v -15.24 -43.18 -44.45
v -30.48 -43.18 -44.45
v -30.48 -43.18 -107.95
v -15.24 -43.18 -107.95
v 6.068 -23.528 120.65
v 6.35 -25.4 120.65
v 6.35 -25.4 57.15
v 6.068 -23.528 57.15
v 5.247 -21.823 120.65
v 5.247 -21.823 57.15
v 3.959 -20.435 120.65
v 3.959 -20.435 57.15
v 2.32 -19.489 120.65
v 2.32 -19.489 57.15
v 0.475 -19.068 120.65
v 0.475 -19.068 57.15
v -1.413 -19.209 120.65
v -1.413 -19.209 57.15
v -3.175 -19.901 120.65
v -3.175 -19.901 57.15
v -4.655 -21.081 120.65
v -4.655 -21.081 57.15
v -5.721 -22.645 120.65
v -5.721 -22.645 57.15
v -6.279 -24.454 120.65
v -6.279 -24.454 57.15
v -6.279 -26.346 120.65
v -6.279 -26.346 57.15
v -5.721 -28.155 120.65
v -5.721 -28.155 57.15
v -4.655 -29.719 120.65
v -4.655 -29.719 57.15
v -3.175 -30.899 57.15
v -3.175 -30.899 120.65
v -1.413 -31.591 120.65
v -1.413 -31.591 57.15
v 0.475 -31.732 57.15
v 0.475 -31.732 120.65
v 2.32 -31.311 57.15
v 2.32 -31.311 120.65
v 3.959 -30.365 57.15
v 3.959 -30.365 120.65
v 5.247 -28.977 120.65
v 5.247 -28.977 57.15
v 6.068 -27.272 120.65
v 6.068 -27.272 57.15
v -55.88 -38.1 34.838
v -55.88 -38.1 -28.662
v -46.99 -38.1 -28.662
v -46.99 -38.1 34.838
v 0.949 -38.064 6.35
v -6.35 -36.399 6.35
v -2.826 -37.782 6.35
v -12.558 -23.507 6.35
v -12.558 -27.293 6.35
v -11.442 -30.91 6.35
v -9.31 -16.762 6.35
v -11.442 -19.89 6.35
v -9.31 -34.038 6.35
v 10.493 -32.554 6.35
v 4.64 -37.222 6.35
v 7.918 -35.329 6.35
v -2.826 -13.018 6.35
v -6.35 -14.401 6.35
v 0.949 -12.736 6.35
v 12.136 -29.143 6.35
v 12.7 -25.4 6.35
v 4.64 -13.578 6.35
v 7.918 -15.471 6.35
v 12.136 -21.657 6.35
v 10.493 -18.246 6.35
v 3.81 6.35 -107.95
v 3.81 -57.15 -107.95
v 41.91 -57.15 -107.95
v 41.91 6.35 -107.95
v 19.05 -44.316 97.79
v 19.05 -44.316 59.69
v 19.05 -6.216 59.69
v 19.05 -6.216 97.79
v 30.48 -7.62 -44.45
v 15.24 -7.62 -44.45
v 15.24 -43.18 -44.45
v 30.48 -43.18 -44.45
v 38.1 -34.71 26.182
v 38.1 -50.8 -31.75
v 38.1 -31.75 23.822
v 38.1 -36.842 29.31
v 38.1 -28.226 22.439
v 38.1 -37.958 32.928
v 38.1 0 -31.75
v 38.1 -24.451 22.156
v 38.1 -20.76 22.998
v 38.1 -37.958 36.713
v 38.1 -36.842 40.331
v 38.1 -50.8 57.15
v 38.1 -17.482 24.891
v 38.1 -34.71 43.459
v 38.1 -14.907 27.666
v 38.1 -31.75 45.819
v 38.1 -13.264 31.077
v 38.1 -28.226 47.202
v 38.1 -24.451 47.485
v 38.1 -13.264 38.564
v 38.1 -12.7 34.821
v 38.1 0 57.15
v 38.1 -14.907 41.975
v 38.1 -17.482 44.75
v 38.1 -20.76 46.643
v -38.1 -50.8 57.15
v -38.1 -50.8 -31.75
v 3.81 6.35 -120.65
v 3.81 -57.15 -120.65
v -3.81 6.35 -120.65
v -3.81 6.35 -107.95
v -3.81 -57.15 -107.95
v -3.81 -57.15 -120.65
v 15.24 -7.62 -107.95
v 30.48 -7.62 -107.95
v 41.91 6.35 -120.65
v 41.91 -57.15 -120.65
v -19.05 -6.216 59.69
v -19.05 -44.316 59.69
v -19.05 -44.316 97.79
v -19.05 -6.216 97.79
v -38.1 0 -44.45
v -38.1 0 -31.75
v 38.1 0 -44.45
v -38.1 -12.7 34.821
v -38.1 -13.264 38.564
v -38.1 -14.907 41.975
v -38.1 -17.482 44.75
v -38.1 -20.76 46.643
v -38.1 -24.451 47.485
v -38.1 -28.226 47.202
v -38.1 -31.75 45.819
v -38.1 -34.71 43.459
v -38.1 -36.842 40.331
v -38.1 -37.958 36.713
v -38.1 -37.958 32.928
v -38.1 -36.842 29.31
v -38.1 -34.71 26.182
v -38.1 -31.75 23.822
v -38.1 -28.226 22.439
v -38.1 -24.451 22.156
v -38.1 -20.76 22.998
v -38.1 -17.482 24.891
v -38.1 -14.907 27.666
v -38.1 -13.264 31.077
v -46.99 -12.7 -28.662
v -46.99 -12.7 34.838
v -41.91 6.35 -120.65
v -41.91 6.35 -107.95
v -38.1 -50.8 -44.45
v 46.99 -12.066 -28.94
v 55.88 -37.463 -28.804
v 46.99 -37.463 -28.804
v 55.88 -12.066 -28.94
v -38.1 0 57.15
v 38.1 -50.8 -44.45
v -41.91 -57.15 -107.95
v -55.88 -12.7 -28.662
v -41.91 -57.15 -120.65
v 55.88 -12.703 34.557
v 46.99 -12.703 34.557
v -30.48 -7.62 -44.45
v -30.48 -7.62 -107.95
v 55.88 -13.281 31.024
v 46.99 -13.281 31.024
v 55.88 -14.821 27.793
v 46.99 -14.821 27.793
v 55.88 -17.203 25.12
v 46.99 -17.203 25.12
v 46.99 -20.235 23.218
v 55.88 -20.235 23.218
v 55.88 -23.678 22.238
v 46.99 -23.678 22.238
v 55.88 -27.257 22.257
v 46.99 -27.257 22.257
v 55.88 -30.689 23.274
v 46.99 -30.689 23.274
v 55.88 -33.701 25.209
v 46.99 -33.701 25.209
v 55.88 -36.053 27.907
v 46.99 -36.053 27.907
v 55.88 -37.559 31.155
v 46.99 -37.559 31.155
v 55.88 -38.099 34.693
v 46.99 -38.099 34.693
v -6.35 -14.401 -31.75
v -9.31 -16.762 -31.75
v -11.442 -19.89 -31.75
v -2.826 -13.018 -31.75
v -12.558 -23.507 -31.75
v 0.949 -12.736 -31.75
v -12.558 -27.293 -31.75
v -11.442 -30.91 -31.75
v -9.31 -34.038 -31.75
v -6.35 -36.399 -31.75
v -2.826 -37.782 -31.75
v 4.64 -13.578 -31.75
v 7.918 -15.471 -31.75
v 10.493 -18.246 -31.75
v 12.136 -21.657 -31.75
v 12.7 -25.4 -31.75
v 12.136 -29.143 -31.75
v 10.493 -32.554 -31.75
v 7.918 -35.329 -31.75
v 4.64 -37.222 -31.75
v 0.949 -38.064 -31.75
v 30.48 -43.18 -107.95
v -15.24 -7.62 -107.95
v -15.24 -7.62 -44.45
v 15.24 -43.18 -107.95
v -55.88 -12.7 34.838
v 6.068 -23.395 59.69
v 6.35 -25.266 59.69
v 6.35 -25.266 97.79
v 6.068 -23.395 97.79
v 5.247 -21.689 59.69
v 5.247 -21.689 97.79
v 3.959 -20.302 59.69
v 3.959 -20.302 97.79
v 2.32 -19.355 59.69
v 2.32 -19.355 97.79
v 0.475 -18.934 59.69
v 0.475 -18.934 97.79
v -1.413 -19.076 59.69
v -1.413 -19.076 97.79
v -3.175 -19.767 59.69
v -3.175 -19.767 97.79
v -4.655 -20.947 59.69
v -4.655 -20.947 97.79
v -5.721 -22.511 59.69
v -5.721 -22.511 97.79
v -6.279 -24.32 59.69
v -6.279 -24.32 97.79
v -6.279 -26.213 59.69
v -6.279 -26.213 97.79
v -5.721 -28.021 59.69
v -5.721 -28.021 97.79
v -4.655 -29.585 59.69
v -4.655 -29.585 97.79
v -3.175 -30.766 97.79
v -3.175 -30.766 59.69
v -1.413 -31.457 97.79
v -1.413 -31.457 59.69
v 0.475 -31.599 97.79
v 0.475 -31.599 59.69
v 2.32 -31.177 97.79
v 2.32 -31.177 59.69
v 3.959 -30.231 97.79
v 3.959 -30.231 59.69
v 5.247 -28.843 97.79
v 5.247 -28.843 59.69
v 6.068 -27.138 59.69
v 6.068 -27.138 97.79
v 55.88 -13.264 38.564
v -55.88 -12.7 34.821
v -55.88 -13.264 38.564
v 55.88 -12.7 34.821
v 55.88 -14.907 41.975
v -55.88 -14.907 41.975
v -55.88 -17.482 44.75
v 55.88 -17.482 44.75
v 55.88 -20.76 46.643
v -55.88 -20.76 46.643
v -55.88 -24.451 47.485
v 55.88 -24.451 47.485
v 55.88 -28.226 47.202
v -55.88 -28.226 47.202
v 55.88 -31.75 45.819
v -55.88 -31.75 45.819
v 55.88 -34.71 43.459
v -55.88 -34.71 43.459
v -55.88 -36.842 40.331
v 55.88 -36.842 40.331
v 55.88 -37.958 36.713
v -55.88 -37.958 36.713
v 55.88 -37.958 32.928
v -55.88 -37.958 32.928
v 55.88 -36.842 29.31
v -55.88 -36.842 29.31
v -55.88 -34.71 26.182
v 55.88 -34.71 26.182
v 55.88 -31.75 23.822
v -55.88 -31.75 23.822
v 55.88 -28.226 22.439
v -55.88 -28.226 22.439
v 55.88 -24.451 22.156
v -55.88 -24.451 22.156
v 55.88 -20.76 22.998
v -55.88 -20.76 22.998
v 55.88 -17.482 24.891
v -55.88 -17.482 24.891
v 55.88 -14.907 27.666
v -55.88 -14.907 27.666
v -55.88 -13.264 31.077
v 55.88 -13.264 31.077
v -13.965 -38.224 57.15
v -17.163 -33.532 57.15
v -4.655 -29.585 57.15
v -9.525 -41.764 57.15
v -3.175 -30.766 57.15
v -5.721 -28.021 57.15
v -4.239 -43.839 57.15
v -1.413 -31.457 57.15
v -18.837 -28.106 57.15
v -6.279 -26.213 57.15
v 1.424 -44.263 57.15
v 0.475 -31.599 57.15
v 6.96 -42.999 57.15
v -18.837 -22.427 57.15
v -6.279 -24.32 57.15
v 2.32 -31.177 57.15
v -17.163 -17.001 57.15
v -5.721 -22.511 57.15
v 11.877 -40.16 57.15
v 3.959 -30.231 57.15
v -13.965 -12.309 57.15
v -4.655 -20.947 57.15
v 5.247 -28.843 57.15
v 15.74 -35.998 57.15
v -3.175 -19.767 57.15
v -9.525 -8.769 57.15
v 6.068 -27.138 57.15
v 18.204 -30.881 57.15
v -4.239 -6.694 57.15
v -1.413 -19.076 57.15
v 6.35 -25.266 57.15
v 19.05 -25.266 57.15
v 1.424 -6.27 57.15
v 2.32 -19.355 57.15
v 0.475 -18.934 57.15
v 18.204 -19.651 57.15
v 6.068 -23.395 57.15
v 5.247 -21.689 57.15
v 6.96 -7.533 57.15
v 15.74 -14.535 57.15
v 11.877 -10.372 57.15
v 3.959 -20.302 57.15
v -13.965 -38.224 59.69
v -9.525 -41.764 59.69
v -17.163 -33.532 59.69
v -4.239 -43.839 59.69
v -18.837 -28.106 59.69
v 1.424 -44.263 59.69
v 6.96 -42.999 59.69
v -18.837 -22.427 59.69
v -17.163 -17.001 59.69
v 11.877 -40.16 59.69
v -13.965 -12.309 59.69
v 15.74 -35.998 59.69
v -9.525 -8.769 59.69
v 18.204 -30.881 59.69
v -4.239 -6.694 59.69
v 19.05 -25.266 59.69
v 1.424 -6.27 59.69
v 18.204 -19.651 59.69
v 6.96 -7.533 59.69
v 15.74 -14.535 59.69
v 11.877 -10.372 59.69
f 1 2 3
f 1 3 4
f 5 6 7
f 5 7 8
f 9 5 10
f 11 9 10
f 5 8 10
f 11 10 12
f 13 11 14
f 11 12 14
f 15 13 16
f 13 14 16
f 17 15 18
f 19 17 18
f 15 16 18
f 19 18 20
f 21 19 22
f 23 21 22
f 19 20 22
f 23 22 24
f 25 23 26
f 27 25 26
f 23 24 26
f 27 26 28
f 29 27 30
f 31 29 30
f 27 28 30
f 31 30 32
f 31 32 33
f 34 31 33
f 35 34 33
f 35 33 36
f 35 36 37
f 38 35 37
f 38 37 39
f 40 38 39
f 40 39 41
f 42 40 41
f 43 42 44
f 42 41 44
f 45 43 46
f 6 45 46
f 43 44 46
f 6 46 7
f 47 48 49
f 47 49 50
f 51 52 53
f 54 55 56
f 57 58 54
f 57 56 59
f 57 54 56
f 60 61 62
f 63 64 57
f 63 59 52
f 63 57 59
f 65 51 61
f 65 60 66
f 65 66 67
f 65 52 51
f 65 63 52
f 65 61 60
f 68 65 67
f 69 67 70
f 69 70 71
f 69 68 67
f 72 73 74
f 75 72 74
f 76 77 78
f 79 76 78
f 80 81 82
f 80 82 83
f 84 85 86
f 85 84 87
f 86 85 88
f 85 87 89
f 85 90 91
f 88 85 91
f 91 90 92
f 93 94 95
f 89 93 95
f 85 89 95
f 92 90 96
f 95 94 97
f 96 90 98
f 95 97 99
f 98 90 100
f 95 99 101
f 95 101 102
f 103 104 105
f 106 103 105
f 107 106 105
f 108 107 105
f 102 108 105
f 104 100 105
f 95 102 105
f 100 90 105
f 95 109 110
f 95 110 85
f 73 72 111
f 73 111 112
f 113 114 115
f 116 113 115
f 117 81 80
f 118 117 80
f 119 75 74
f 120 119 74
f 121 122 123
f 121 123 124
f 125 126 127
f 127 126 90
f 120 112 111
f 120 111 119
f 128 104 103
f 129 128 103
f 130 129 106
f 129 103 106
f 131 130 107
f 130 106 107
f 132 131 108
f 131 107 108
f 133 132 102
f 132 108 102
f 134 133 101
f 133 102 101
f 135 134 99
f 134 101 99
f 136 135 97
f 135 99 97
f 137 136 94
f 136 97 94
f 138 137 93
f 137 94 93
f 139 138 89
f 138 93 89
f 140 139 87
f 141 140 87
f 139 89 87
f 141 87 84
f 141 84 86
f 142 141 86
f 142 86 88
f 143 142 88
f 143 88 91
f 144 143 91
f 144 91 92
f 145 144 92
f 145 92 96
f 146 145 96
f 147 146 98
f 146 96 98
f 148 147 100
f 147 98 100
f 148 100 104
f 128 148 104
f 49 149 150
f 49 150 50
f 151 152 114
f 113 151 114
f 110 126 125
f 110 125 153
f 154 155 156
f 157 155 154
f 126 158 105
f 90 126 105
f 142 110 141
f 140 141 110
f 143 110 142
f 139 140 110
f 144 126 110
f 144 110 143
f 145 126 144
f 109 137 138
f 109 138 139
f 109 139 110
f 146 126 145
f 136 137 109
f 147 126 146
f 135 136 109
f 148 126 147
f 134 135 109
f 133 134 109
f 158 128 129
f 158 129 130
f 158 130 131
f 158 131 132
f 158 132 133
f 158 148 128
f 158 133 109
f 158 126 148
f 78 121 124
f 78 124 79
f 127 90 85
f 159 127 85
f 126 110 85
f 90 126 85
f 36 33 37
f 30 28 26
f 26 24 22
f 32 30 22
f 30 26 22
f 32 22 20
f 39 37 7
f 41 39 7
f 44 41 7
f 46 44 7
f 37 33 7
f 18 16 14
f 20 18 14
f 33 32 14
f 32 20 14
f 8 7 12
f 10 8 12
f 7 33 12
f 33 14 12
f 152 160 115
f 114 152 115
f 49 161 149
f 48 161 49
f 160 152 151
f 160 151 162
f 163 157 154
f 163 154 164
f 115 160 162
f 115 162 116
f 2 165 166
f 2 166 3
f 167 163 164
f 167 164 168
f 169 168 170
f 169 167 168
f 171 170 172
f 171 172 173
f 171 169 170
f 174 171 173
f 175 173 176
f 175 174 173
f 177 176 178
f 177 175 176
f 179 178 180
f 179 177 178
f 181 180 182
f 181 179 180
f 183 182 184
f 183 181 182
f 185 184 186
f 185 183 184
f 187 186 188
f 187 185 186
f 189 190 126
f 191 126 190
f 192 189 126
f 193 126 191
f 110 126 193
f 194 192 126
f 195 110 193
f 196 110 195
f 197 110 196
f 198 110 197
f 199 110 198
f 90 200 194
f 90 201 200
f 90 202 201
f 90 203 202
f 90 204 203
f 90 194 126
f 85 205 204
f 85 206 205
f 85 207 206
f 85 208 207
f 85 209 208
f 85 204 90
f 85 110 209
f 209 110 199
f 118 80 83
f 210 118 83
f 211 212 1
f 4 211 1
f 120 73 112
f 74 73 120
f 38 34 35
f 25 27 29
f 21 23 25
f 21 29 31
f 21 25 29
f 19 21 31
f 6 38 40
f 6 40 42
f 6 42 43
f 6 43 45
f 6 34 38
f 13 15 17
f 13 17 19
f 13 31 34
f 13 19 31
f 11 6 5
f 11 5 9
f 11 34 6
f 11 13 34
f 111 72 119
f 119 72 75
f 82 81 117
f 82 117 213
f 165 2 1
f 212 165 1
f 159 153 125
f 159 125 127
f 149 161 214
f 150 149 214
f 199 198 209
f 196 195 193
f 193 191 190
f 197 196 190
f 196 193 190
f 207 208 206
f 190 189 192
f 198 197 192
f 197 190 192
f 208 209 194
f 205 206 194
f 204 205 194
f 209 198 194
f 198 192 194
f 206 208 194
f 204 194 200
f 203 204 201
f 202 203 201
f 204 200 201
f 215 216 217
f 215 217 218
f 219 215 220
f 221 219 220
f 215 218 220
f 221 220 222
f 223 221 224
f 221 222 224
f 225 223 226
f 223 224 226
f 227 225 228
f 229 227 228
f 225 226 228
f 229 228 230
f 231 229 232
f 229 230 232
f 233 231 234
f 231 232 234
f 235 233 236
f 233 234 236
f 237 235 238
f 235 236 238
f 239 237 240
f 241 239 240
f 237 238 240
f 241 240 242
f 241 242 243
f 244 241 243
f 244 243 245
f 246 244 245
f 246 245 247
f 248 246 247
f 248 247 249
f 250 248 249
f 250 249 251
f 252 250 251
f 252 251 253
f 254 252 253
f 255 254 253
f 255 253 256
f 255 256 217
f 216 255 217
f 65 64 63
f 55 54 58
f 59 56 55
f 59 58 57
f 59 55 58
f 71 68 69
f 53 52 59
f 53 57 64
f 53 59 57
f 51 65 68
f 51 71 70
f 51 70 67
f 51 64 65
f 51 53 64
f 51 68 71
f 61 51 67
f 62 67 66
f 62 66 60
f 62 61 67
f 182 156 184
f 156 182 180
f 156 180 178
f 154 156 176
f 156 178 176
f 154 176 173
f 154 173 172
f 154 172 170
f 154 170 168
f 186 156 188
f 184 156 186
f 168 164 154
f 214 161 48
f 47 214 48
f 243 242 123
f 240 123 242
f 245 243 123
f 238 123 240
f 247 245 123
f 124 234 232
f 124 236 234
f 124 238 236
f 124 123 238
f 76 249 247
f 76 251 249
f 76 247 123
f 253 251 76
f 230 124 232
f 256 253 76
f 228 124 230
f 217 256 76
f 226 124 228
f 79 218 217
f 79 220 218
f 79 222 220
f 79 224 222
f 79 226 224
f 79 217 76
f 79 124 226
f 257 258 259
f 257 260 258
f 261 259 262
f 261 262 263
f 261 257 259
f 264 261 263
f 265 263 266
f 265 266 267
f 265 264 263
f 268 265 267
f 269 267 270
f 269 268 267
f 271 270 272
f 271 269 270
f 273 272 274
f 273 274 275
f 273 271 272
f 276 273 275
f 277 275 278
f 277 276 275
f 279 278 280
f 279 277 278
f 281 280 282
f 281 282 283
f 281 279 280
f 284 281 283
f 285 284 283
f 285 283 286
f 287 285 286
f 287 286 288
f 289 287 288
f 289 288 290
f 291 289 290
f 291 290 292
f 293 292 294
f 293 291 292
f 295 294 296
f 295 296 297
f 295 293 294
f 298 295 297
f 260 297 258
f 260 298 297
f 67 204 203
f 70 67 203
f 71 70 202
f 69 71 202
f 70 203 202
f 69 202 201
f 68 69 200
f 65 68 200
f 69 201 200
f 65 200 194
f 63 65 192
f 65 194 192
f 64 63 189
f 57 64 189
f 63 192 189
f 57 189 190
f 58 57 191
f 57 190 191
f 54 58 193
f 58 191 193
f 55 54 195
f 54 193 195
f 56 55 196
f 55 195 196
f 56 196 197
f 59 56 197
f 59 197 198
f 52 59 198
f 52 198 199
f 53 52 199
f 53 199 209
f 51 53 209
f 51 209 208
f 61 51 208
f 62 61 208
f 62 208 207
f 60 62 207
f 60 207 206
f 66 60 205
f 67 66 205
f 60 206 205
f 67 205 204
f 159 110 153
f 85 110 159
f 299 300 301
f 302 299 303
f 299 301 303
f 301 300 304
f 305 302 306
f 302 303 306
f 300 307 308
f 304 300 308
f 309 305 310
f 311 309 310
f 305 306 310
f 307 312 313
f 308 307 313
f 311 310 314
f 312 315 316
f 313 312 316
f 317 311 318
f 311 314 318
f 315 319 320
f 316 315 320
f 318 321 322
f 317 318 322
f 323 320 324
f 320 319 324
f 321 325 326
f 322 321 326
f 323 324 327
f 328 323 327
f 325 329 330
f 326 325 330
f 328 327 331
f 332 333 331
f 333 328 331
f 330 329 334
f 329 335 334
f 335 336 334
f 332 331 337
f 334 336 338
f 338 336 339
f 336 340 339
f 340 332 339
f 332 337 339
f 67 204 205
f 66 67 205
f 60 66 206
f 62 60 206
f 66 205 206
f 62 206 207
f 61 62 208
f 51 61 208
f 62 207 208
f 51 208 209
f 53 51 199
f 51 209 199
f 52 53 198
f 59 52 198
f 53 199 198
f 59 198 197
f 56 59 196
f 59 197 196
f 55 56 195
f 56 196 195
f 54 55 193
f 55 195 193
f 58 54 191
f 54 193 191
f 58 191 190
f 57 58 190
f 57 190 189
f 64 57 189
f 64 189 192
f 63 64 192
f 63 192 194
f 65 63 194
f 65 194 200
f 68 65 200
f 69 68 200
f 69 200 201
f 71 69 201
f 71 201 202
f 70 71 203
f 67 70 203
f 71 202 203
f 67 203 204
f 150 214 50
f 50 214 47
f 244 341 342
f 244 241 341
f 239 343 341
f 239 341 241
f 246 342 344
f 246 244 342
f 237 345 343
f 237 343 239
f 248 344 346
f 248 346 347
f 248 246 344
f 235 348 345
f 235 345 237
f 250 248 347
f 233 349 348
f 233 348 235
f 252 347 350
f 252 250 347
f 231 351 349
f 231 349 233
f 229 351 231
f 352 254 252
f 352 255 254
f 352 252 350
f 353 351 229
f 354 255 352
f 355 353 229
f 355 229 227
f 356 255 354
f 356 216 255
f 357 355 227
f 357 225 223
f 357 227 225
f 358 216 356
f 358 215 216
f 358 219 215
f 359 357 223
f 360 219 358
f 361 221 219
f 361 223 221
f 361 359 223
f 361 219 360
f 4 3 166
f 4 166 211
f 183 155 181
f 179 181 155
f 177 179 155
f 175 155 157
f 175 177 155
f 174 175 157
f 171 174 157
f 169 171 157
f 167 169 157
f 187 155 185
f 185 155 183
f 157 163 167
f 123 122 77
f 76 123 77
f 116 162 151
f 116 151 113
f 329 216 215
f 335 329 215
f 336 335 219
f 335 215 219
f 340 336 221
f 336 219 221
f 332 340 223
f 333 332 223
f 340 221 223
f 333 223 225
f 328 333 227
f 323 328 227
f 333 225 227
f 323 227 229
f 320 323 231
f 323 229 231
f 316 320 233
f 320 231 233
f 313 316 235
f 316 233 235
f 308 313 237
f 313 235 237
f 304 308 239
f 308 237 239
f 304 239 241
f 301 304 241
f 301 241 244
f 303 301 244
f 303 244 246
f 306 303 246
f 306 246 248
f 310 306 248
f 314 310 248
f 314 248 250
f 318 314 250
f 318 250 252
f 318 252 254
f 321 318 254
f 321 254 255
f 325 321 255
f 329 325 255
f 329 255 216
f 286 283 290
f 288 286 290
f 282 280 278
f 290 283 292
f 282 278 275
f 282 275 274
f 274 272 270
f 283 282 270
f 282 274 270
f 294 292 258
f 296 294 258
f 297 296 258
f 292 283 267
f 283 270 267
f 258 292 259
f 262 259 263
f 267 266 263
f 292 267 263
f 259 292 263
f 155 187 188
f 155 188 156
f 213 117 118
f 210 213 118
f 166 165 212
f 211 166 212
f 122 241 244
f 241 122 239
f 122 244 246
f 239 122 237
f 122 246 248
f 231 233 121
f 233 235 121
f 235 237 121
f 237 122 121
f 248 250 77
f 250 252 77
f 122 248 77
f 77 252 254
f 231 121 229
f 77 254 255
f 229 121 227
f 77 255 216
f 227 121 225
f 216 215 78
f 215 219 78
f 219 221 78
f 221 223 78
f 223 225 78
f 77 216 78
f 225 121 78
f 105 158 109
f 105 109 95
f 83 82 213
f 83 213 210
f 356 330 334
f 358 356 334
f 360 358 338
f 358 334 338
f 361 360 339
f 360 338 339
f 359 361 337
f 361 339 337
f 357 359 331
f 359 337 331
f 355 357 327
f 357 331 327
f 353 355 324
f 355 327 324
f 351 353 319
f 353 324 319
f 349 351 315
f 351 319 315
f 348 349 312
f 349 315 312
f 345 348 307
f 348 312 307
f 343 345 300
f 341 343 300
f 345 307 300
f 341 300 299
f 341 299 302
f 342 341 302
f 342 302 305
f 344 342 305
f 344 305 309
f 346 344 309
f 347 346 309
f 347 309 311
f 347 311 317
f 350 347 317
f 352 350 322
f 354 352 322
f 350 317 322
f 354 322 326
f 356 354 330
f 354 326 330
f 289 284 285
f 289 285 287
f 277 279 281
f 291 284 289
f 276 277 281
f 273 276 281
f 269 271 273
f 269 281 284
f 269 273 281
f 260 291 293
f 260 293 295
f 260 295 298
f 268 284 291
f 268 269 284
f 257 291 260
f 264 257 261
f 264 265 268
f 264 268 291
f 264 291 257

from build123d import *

# Parameters (mm, degrees)
F0_W          = 76.2
F0_H          = 114.3
F1_DEPTH      = 50.8
F2_R          = 12.7
F3_DEPTH      = 76.2
F4_W          = 76.2
F4_H          = 50.8
F4_R          = 12.7
F5_DEPTH      = 25.4
F6_R          = 12.7
F7_DEPTH      = 38.1
F8_R          = 12.7
F9_DEPTH      = 17.78
F9_DEPTH_BACK = 93.98
F11_DEPTH     = 8.89
F12_W         = 25.4
F12_H         = 63.5
F13_DEPTH     = 8.89
F14_W         = 76.2
F14_H         = 50.8
F15_DEPTH     = 12.7
F16_W         = 15.24
F16_H         = 35.56
F17_DEPTH     = 63.5
F18_W         = 38.1
F18_H         = 63.5
F18_W_2       = 15.24
F18_H_2       = 35.56
F19_DEPTH     = 12.7
F20_R         = 19.05
F21_DEPTH     = 2.54
F22_W         = 38.1
F22_H         = 38.1
F23_DEPTH     = 38.1
F24_R         = 6.35
F25_DEPTH     = 40.64
F26_R         = 6.35
F27_DEPTH     = 63.5
F28_R         = 12.7
F29_DEPTH     = 38.1


# Not quite as in the source:
# - a feature of the source that left no trace in its solid (it failed there, or was rolled back) is left out


with BuildPart() as f1:
    # F0 (on Front) → F1 (new body)
    with BuildSketch(Plane.XZ):
        Rectangle(F0_W, F0_H)
    extrude(amount=F1_DEPTH)

    # F2 (on face) → F3 (cut)
    with BuildSketch(Plane.YZ.offset(38.1)):
        with Locations((-25.4, 34.8205566406)):
            Circle(F2_R)
    extrude(amount=-F3_DEPTH, mode=Mode.SUBTRACT)

    # F4 (on face) → F5 (cut)
    with BuildSketch(Plane(origin=(0, 0, -57.15), x_dir=(1, 0, 0), z_dir=(0, 0, -1))):
        with Locations((0, 25.4)):
            Rectangle(F4_W, F4_H)
        with Locations((0, 25.4)):
            Circle(F4_R, mode=Mode.SUBTRACT)
        with Locations((0, 25.4)):
            Circle(F4_R)
    extrude(amount=-F5_DEPTH, mode=Mode.SUBTRACT)

    # F6 (on face) → F7 (cut)
    with BuildSketch(Plane(origin=(0, 0, -31.75), x_dir=(1, 0, 0), z_dir=(0, 0, -1))):
        with Locations((0, 25.4)):
            Circle(F6_R)
    extrude(amount=-F7_DEPTH, mode=Mode.SUBTRACT)


with BuildPart() as f9:
    # F8 (on face) → F9 (new body, two sides)
    with BuildSketch(Plane.YZ.offset(38.1)) as f9_sk:
        with Locations((-25.4, 34.8205566406)):
            Circle(F8_R)
    extrude(amount=F9_DEPTH)
    extrude(f9_sk.sketch, amount=-F9_DEPTH_BACK)


with BuildPart() as f11:
    # F10 (on face) → F11 (new body)
    with BuildSketch(Plane.YZ.offset(55.88)):
        with BuildLine():
            ThreePointArc((-12.7027346591, 34.5570175282), (-25.4681418528, 22.1207394495), (-38.0993622657, 34.6932851007))
            Line((-38.0993622657, 34.6932851007), (-37.4630045663, -28.8035262277))
            Line((-37.4630045663, -28.8035262277), (-12.0663769597, -28.9397938002))
            Line((-12.0663769597, -28.9397938002), (-12.7027346591, 34.5570175282))
        make_face()
    extrude(amount=-F11_DEPTH)


with BuildPart() as f13:
    # F12 (on face) → F13 (new body)
    with BuildSketch(Plane(origin=(-55.88, 0, 0), x_dir=(0, -1, 0), z_dir=(-1, 0, 0))):
        with Locations((25.4000125671, 3.0884229026)):
            Rectangle(F12_W, F12_H)
    extrude(amount=-F13_DEPTH)


with BuildPart() as f15:
    # F14 (on face) → F15 (new body)
    with BuildSketch(Plane(origin=(0, 0, -31.75), x_dir=(1, 0, 0), z_dir=(0, 0, -1))):
        with Locations((0, 25.4)):
            Rectangle(F14_W, F14_H)
    extrude(amount=F15_DEPTH)


with BuildPart() as f17:
    # F16 (on face) → F17 (new body)
    with BuildSketch(Plane(origin=(0, 0, -44.45), x_dir=(1, 0, 0), z_dir=(0, 0, -1))):
        with Locations((-22.86, 25.4)):
            Rectangle(F16_W, F16_H)
    extrude(amount=F17_DEPTH)


with BuildPart() as f17b:
    # F16 (on face) → F17, piece 2 (new body)
    with BuildSketch(Plane(origin=(0, 0, -44.45), x_dir=(1, 0, 0), z_dir=(0, 0, -1))):
        with Locations((22.86, 25.4)):
            Rectangle(F16_W, F16_H)
    extrude(amount=F17_DEPTH)


with BuildPart() as f19:
    # F18 (on face) → F19 (new body)
    with BuildSketch(Plane(origin=(0, 0, -107.95), x_dir=(1, 0, 0), z_dir=(0, 0, -1))):
        with Locations((-22.86, 25.4)):
            Rectangle(F18_W, F18_H)
        with Locations((-22.86, 25.4)):
            Rectangle(F18_W_2, F18_H_2, mode=Mode.SUBTRACT)
        with Locations((-22.86, 25.4)):
            Rectangle(F18_W_2, F18_H_2)
    extrude(amount=F19_DEPTH)


with BuildPart() as f19b:
    # F18 (on face) → F19, piece 2 (new body)
    with BuildSketch(Plane(origin=(0, 0, -107.95), x_dir=(1, 0, 0), z_dir=(0, 0, -1))):
        with Locations((22.86, 25.4)):
            Rectangle(F18_W, F18_H)
    extrude(amount=F19_DEPTH)


with BuildPart() as f21:
    # F20 (on face) → F21 (new body)
    with BuildSketch(Plane.XY.offset(57.15)):
        with Locations((0, -25.266315788)):
            Circle(F20_R)
    extrude(amount=F21_DEPTH)


with BuildPart() as f23:
    # F22 (on face) → F23 (new body)
    with BuildSketch(Plane.XY.offset(59.69)):
        with Locations((0, -25.266315788)):
            Rectangle(F22_W, F22_H)
    extrude(amount=F23_DEPTH)


with BuildPart() as f25_tool:
    # F24 (on face) → F25 (new body)
    with BuildSketch(Plane.XY.offset(97.79)):
        with Locations((0, -25.266315788)):
            Circle(F24_R)
    extrude(amount=-F25_DEPTH)


with BuildPart() as f21_1:
    add(f21.part)

    # F25: cut by f25_tool
    add(f25_tool.part, mode=Mode.SUBTRACT)


with BuildPart() as f23_1:
    add(f23.part)

    # F25: cut by f25_tool
    add(f25_tool.part, mode=Mode.SUBTRACT)


with BuildPart() as f27:
    # F26 (on face) → F27 (new body)
    with BuildSketch(Plane.XY.offset(57.15)):
        with Locations((0, -25.4)):
            Circle(F26_R)
    extrude(amount=F27_DEPTH)


with BuildPart() as f29:
    # F28 (on face) → F29 (new body)
    with BuildSketch(Plane.XY.offset(-31.75)):
        with Locations((0, -25.4)):
            Circle(F28_R)
    extrude(amount=F29_DEPTH)


solid = Compound([f1.part, f9.part, f11.part, f13.part, f15.part, f17.part, f17b.part, f19.part, f19b.part, f21_1.part, f23_1.part, f27.part, f29.part])
